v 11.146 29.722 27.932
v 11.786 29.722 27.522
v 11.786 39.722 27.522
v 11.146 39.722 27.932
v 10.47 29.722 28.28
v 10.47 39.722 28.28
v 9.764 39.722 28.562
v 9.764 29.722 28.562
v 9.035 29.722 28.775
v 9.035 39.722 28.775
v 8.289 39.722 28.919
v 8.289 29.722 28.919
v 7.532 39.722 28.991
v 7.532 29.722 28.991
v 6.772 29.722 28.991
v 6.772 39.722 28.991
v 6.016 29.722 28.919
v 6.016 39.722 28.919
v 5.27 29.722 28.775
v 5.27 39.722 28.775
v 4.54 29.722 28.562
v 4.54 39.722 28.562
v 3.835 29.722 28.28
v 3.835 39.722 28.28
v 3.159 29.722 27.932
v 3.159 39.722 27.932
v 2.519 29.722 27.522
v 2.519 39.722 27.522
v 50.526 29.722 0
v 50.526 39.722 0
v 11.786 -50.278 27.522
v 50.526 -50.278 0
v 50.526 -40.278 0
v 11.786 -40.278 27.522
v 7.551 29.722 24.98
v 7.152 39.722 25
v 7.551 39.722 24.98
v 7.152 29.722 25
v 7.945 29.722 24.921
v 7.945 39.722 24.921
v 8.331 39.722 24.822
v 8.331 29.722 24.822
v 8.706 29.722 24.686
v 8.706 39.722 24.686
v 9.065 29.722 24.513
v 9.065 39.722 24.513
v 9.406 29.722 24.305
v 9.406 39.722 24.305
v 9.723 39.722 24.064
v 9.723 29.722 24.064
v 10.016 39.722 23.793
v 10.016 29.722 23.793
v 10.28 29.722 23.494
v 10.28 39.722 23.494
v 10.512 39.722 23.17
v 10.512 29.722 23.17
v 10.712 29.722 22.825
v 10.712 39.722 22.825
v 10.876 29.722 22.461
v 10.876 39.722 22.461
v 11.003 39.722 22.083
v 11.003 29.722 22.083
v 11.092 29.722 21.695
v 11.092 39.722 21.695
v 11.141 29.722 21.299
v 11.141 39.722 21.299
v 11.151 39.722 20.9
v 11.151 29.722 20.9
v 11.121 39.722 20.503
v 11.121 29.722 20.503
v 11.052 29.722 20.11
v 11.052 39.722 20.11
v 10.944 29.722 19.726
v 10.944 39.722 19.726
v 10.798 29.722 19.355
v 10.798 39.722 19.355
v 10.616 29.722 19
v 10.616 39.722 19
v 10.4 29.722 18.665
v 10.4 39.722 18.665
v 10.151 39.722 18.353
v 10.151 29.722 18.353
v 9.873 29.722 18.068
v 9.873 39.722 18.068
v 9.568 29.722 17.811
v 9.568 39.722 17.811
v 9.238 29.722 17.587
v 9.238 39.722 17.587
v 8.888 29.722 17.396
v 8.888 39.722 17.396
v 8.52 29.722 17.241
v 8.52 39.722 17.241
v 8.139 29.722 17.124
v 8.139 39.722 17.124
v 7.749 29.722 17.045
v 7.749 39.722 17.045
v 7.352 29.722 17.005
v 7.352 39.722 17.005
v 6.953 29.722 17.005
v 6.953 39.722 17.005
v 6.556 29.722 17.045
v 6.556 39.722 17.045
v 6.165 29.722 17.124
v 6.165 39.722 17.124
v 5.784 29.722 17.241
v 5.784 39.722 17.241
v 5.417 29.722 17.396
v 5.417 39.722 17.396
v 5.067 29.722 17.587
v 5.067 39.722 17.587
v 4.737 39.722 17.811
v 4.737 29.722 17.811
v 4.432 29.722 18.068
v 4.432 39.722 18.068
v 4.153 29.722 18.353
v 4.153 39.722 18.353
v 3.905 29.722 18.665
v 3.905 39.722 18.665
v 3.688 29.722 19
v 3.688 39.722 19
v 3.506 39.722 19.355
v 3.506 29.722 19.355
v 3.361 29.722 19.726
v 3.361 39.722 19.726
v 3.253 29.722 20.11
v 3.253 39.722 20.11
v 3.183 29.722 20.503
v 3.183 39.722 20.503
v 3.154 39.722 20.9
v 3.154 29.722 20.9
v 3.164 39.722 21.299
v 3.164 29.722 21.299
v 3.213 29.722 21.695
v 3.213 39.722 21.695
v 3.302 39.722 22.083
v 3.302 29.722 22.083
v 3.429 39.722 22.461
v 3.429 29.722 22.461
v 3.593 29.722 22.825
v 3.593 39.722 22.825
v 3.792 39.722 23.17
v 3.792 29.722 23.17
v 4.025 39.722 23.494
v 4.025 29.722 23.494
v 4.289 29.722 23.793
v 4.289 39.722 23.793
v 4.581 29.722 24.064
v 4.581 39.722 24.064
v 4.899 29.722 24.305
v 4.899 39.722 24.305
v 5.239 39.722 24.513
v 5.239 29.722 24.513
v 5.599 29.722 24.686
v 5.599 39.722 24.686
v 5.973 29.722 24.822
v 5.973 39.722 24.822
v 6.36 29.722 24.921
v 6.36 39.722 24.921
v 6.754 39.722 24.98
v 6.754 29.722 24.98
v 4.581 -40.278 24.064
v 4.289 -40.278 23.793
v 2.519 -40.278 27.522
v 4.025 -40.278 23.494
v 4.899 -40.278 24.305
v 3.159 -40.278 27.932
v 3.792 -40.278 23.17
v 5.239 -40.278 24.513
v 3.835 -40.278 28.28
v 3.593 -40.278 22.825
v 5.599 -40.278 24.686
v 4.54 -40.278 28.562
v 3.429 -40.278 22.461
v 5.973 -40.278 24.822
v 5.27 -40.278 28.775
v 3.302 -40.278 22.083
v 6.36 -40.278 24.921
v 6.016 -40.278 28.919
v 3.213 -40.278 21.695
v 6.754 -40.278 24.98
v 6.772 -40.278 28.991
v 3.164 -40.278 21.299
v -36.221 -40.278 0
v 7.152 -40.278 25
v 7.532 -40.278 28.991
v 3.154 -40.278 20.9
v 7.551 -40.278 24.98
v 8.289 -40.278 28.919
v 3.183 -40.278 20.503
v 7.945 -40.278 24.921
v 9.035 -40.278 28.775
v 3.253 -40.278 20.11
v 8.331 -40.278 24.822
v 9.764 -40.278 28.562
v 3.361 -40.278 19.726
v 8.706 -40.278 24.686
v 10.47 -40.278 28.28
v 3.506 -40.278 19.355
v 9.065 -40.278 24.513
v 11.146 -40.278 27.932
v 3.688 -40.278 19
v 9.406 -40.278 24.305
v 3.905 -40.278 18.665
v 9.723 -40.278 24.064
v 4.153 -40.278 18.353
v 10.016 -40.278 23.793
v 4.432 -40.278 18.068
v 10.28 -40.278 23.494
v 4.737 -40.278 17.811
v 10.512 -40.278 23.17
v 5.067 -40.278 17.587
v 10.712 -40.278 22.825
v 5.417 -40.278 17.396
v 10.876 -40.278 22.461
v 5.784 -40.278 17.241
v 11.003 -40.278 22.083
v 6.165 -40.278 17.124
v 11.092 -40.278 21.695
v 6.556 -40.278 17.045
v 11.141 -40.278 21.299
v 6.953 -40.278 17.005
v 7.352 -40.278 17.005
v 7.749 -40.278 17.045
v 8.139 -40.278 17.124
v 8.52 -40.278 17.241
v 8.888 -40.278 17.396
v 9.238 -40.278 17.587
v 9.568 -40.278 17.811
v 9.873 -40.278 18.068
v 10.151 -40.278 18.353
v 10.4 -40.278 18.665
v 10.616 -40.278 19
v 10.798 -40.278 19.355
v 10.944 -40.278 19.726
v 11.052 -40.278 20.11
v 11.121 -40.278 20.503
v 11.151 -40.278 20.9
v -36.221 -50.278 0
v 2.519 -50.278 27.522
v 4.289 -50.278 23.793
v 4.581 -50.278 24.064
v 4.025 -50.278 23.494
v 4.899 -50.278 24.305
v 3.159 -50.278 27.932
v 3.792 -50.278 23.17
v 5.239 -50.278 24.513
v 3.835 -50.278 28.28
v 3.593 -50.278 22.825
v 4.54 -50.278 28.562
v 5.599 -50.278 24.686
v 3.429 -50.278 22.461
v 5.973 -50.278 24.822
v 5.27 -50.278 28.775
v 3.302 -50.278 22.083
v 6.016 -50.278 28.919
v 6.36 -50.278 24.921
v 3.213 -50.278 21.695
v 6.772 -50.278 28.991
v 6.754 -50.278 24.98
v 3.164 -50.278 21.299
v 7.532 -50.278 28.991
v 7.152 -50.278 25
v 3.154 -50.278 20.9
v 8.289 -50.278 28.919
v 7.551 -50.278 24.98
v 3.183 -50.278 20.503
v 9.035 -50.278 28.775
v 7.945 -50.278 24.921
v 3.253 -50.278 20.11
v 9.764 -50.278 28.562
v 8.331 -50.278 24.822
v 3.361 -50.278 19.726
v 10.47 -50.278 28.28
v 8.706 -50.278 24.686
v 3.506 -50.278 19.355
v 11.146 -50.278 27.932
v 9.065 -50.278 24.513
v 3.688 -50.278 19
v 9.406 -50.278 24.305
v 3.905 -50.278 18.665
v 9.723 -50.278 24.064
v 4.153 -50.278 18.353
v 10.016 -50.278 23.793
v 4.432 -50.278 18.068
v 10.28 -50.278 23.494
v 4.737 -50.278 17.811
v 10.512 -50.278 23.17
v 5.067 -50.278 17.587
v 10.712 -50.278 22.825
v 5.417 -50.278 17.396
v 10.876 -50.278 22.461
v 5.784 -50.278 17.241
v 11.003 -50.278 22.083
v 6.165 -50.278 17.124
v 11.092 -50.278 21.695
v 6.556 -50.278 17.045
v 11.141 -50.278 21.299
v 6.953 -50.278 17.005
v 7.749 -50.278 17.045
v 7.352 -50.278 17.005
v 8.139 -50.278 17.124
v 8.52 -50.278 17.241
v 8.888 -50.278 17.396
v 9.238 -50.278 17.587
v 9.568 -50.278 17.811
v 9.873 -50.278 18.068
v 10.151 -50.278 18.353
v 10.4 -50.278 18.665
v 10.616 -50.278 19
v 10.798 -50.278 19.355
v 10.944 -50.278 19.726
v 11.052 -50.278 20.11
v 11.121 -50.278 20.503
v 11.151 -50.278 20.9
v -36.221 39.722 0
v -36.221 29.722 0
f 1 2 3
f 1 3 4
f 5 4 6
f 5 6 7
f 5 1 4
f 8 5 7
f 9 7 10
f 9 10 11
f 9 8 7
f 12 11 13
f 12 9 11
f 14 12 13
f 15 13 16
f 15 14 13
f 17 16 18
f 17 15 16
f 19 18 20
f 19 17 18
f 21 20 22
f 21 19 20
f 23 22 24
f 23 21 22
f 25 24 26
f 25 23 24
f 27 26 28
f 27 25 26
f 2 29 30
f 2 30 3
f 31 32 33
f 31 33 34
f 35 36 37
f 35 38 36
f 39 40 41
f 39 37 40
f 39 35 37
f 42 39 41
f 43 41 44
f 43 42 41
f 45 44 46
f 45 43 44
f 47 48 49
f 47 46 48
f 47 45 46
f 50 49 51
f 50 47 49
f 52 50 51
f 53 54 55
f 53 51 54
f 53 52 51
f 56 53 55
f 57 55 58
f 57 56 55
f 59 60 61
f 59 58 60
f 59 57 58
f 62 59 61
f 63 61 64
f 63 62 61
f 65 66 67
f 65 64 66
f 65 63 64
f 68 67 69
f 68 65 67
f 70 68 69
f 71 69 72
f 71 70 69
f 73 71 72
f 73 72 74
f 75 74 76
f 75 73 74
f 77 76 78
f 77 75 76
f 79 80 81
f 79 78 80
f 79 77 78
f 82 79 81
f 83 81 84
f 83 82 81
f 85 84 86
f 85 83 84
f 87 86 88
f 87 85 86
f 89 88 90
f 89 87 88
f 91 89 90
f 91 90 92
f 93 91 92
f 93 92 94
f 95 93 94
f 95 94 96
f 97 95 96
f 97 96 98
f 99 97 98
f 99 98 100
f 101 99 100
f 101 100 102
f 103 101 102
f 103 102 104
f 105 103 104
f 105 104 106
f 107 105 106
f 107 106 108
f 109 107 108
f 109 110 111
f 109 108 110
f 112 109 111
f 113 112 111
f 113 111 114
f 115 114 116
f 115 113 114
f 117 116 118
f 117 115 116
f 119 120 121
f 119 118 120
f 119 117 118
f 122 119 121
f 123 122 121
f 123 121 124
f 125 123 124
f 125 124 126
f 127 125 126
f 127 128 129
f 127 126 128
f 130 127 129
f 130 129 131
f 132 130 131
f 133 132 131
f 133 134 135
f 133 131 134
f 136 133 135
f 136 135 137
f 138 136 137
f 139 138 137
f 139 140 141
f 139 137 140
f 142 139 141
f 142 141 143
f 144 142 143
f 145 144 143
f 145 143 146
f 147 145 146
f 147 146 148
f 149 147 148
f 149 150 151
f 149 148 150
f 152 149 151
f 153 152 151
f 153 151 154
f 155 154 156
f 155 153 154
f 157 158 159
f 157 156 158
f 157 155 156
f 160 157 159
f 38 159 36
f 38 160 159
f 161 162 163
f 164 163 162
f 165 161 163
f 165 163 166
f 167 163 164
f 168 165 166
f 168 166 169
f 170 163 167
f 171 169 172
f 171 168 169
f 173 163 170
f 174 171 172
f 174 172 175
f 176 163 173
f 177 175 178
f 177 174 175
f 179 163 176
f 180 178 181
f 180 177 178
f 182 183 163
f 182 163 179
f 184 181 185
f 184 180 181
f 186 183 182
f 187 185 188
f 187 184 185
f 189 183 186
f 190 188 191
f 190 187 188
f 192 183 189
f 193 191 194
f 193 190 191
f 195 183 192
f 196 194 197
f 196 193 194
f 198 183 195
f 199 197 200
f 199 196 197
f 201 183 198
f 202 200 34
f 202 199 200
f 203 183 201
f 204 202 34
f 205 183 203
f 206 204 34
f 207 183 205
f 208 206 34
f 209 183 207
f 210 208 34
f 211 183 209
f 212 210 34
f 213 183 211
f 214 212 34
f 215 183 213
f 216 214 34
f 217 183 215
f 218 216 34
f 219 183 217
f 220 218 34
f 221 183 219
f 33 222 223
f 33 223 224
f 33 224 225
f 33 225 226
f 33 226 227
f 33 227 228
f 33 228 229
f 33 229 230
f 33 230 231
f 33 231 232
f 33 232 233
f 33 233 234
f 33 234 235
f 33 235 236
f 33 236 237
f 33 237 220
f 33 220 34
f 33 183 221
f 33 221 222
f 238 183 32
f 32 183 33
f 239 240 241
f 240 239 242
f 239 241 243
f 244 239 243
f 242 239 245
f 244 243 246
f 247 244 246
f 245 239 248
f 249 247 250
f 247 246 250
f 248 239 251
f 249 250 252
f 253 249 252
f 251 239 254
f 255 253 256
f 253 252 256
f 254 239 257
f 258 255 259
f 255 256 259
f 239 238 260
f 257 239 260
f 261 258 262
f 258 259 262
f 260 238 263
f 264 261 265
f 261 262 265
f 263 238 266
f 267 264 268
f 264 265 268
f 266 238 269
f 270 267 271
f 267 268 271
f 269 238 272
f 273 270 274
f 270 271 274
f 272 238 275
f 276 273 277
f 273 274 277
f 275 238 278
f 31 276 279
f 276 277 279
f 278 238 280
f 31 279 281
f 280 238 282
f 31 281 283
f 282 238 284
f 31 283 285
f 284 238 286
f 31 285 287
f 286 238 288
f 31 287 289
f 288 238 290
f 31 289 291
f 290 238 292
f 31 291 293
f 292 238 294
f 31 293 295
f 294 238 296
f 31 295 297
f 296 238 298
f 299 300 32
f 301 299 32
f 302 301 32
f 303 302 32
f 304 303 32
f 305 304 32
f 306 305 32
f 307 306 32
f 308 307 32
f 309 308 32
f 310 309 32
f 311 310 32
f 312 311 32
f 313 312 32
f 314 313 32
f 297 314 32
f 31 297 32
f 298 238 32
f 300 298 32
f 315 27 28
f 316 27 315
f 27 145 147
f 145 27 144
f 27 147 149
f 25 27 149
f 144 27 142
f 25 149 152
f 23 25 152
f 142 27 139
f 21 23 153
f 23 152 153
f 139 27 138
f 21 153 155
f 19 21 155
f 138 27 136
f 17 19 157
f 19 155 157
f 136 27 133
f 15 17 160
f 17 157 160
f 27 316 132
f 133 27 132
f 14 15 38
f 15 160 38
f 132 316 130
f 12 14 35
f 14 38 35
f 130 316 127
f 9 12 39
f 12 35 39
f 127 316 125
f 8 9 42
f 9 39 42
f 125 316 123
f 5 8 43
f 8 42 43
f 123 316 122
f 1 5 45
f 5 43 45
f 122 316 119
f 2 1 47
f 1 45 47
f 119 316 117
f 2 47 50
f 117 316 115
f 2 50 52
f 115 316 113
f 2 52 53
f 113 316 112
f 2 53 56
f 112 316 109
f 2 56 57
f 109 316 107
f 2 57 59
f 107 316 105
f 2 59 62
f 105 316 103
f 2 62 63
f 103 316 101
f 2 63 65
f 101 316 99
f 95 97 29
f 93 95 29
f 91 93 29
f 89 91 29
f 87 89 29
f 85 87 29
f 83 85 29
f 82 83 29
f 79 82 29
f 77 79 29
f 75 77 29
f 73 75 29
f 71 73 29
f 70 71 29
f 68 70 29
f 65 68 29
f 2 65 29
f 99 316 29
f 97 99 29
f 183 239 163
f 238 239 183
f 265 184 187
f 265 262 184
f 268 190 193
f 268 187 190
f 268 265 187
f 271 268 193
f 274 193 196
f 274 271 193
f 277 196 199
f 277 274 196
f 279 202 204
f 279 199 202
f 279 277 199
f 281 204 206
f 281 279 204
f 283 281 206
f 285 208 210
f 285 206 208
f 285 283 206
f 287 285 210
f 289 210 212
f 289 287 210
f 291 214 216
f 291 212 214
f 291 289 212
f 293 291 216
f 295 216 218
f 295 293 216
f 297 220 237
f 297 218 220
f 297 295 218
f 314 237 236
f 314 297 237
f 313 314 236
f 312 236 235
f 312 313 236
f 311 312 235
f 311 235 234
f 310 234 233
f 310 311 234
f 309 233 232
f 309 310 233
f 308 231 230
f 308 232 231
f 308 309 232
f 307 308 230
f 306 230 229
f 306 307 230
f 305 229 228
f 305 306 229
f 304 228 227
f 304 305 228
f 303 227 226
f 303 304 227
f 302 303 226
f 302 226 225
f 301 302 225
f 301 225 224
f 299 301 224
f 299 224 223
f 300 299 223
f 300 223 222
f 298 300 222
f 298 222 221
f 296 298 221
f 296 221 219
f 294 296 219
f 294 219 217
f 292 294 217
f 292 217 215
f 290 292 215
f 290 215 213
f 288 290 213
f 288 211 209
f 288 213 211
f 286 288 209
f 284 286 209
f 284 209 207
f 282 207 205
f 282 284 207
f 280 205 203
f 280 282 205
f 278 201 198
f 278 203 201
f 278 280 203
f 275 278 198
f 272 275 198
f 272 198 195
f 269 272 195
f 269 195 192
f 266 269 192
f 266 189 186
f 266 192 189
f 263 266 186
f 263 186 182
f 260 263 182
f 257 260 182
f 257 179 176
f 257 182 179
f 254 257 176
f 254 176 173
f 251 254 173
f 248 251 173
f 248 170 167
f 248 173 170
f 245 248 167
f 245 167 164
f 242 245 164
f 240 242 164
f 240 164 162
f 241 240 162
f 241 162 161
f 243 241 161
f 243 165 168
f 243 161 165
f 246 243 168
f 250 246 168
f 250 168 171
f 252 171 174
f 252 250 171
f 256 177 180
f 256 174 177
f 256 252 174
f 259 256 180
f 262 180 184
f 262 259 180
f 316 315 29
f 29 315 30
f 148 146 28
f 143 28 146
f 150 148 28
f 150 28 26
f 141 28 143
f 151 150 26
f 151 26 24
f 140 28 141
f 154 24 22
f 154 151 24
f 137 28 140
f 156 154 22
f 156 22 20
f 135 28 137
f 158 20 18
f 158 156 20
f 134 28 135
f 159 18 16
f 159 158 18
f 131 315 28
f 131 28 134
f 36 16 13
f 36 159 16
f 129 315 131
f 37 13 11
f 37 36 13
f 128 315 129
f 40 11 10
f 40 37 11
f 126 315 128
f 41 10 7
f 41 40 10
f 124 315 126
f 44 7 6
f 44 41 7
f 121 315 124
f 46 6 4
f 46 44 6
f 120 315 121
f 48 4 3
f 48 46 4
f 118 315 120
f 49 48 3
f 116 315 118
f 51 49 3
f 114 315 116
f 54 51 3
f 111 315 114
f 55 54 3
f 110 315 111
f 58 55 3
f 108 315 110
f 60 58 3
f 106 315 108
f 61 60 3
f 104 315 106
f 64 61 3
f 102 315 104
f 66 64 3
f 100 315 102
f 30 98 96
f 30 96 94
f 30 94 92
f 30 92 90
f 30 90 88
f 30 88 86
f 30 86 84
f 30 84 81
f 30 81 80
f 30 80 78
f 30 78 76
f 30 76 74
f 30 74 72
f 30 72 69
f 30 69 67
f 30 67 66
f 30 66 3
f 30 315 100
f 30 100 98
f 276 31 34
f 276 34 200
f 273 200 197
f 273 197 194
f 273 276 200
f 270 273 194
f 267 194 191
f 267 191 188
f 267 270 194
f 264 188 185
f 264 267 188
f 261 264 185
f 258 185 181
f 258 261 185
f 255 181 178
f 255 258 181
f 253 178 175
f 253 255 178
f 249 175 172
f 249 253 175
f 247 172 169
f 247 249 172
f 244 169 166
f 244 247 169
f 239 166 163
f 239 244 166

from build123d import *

# Parameters (mm, degrees)
SKETCH2_W               = 86.746757864
SKETCH2_H               = 10
BOSS_EXTRUDE1_DEPTH     = 50
BOSS_EXTRUDE1_2_DEPTH   = 50
CUT_EXTRUDE1_DEPTH      = 115.685870942
CUT_EXTRUDE1_DEPTH_BACK = 115.685870942
SKETCH3_R               = 4


with BuildPart() as part:
    # Sketch2 → Boss-Extrude1 (new body)
    with BuildSketch(Plane.XY):
        with Locations((7.152347127, 34.722322634)):
            Rectangle(SKETCH2_W, SKETCH2_H)
    extrude(amount=BOSS_EXTRUDE1_DEPTH)


with BuildPart() as body_2:
    # Sketch2 → Boss-Extrude1 2 (new body)
    with BuildSketch(Plane.XY):
        with Locations((7.152347127, -45.277677366)):
            Rectangle(SKETCH2_W, SKETCH2_H)
    extrude(amount=BOSS_EXTRUDE1_2_DEPTH)


with BuildPart() as cut_extrude1_tool:
    # Sketch3 → Cut-Extrude1 (new, two sides: drawn at the far end of the back side and taken through both)
    with BuildSketch(Plane(origin=(0, 39.722322634, 0), x_dir=(1, 0, 0), z_dir=(0, 1, 0)).offset(-CUT_EXTRUDE1_DEPTH_BACK)):
        with BuildLine():
            Line((50.525726059, -50), (50.525726059, 0))
            Line((50.525726059, 0), (11.78554007, -27.521773007))
            ThreePointArc((11.78554007, -27.521773007), (7.152347127, -29), (2.519154185, -27.521773007))
            Line((2.519154185, -27.521773007), (-36.221031805, 0))
            Line((-36.221031805, 0), (-36.221031805, -50))
            Line((-36.221031805, -50), (50.525726059, -50))
        make_face()
        with Locations(Location((7.152347127, -21, 0), (0, 0, 270))):
            Circle(SKETCH3_R)
    extrude(amount=CUT_EXTRUDE1_DEPTH + CUT_EXTRUDE1_DEPTH_BACK)


with BuildPart() as part_1:
    add(part.part)

    # Cut-Extrude1: cut by cut_extrude1_tool
    add(cut_extrude1_tool.part, mode=Mode.SUBTRACT)


with BuildPart() as body_2_1:
    add(body_2.part)

    # Cut-Extrude1: cut by cut_extrude1_tool
    add(cut_extrude1_tool.part, mode=Mode.SUBTRACT)


solid = Compound([part_1.part, body_2_1.part])
